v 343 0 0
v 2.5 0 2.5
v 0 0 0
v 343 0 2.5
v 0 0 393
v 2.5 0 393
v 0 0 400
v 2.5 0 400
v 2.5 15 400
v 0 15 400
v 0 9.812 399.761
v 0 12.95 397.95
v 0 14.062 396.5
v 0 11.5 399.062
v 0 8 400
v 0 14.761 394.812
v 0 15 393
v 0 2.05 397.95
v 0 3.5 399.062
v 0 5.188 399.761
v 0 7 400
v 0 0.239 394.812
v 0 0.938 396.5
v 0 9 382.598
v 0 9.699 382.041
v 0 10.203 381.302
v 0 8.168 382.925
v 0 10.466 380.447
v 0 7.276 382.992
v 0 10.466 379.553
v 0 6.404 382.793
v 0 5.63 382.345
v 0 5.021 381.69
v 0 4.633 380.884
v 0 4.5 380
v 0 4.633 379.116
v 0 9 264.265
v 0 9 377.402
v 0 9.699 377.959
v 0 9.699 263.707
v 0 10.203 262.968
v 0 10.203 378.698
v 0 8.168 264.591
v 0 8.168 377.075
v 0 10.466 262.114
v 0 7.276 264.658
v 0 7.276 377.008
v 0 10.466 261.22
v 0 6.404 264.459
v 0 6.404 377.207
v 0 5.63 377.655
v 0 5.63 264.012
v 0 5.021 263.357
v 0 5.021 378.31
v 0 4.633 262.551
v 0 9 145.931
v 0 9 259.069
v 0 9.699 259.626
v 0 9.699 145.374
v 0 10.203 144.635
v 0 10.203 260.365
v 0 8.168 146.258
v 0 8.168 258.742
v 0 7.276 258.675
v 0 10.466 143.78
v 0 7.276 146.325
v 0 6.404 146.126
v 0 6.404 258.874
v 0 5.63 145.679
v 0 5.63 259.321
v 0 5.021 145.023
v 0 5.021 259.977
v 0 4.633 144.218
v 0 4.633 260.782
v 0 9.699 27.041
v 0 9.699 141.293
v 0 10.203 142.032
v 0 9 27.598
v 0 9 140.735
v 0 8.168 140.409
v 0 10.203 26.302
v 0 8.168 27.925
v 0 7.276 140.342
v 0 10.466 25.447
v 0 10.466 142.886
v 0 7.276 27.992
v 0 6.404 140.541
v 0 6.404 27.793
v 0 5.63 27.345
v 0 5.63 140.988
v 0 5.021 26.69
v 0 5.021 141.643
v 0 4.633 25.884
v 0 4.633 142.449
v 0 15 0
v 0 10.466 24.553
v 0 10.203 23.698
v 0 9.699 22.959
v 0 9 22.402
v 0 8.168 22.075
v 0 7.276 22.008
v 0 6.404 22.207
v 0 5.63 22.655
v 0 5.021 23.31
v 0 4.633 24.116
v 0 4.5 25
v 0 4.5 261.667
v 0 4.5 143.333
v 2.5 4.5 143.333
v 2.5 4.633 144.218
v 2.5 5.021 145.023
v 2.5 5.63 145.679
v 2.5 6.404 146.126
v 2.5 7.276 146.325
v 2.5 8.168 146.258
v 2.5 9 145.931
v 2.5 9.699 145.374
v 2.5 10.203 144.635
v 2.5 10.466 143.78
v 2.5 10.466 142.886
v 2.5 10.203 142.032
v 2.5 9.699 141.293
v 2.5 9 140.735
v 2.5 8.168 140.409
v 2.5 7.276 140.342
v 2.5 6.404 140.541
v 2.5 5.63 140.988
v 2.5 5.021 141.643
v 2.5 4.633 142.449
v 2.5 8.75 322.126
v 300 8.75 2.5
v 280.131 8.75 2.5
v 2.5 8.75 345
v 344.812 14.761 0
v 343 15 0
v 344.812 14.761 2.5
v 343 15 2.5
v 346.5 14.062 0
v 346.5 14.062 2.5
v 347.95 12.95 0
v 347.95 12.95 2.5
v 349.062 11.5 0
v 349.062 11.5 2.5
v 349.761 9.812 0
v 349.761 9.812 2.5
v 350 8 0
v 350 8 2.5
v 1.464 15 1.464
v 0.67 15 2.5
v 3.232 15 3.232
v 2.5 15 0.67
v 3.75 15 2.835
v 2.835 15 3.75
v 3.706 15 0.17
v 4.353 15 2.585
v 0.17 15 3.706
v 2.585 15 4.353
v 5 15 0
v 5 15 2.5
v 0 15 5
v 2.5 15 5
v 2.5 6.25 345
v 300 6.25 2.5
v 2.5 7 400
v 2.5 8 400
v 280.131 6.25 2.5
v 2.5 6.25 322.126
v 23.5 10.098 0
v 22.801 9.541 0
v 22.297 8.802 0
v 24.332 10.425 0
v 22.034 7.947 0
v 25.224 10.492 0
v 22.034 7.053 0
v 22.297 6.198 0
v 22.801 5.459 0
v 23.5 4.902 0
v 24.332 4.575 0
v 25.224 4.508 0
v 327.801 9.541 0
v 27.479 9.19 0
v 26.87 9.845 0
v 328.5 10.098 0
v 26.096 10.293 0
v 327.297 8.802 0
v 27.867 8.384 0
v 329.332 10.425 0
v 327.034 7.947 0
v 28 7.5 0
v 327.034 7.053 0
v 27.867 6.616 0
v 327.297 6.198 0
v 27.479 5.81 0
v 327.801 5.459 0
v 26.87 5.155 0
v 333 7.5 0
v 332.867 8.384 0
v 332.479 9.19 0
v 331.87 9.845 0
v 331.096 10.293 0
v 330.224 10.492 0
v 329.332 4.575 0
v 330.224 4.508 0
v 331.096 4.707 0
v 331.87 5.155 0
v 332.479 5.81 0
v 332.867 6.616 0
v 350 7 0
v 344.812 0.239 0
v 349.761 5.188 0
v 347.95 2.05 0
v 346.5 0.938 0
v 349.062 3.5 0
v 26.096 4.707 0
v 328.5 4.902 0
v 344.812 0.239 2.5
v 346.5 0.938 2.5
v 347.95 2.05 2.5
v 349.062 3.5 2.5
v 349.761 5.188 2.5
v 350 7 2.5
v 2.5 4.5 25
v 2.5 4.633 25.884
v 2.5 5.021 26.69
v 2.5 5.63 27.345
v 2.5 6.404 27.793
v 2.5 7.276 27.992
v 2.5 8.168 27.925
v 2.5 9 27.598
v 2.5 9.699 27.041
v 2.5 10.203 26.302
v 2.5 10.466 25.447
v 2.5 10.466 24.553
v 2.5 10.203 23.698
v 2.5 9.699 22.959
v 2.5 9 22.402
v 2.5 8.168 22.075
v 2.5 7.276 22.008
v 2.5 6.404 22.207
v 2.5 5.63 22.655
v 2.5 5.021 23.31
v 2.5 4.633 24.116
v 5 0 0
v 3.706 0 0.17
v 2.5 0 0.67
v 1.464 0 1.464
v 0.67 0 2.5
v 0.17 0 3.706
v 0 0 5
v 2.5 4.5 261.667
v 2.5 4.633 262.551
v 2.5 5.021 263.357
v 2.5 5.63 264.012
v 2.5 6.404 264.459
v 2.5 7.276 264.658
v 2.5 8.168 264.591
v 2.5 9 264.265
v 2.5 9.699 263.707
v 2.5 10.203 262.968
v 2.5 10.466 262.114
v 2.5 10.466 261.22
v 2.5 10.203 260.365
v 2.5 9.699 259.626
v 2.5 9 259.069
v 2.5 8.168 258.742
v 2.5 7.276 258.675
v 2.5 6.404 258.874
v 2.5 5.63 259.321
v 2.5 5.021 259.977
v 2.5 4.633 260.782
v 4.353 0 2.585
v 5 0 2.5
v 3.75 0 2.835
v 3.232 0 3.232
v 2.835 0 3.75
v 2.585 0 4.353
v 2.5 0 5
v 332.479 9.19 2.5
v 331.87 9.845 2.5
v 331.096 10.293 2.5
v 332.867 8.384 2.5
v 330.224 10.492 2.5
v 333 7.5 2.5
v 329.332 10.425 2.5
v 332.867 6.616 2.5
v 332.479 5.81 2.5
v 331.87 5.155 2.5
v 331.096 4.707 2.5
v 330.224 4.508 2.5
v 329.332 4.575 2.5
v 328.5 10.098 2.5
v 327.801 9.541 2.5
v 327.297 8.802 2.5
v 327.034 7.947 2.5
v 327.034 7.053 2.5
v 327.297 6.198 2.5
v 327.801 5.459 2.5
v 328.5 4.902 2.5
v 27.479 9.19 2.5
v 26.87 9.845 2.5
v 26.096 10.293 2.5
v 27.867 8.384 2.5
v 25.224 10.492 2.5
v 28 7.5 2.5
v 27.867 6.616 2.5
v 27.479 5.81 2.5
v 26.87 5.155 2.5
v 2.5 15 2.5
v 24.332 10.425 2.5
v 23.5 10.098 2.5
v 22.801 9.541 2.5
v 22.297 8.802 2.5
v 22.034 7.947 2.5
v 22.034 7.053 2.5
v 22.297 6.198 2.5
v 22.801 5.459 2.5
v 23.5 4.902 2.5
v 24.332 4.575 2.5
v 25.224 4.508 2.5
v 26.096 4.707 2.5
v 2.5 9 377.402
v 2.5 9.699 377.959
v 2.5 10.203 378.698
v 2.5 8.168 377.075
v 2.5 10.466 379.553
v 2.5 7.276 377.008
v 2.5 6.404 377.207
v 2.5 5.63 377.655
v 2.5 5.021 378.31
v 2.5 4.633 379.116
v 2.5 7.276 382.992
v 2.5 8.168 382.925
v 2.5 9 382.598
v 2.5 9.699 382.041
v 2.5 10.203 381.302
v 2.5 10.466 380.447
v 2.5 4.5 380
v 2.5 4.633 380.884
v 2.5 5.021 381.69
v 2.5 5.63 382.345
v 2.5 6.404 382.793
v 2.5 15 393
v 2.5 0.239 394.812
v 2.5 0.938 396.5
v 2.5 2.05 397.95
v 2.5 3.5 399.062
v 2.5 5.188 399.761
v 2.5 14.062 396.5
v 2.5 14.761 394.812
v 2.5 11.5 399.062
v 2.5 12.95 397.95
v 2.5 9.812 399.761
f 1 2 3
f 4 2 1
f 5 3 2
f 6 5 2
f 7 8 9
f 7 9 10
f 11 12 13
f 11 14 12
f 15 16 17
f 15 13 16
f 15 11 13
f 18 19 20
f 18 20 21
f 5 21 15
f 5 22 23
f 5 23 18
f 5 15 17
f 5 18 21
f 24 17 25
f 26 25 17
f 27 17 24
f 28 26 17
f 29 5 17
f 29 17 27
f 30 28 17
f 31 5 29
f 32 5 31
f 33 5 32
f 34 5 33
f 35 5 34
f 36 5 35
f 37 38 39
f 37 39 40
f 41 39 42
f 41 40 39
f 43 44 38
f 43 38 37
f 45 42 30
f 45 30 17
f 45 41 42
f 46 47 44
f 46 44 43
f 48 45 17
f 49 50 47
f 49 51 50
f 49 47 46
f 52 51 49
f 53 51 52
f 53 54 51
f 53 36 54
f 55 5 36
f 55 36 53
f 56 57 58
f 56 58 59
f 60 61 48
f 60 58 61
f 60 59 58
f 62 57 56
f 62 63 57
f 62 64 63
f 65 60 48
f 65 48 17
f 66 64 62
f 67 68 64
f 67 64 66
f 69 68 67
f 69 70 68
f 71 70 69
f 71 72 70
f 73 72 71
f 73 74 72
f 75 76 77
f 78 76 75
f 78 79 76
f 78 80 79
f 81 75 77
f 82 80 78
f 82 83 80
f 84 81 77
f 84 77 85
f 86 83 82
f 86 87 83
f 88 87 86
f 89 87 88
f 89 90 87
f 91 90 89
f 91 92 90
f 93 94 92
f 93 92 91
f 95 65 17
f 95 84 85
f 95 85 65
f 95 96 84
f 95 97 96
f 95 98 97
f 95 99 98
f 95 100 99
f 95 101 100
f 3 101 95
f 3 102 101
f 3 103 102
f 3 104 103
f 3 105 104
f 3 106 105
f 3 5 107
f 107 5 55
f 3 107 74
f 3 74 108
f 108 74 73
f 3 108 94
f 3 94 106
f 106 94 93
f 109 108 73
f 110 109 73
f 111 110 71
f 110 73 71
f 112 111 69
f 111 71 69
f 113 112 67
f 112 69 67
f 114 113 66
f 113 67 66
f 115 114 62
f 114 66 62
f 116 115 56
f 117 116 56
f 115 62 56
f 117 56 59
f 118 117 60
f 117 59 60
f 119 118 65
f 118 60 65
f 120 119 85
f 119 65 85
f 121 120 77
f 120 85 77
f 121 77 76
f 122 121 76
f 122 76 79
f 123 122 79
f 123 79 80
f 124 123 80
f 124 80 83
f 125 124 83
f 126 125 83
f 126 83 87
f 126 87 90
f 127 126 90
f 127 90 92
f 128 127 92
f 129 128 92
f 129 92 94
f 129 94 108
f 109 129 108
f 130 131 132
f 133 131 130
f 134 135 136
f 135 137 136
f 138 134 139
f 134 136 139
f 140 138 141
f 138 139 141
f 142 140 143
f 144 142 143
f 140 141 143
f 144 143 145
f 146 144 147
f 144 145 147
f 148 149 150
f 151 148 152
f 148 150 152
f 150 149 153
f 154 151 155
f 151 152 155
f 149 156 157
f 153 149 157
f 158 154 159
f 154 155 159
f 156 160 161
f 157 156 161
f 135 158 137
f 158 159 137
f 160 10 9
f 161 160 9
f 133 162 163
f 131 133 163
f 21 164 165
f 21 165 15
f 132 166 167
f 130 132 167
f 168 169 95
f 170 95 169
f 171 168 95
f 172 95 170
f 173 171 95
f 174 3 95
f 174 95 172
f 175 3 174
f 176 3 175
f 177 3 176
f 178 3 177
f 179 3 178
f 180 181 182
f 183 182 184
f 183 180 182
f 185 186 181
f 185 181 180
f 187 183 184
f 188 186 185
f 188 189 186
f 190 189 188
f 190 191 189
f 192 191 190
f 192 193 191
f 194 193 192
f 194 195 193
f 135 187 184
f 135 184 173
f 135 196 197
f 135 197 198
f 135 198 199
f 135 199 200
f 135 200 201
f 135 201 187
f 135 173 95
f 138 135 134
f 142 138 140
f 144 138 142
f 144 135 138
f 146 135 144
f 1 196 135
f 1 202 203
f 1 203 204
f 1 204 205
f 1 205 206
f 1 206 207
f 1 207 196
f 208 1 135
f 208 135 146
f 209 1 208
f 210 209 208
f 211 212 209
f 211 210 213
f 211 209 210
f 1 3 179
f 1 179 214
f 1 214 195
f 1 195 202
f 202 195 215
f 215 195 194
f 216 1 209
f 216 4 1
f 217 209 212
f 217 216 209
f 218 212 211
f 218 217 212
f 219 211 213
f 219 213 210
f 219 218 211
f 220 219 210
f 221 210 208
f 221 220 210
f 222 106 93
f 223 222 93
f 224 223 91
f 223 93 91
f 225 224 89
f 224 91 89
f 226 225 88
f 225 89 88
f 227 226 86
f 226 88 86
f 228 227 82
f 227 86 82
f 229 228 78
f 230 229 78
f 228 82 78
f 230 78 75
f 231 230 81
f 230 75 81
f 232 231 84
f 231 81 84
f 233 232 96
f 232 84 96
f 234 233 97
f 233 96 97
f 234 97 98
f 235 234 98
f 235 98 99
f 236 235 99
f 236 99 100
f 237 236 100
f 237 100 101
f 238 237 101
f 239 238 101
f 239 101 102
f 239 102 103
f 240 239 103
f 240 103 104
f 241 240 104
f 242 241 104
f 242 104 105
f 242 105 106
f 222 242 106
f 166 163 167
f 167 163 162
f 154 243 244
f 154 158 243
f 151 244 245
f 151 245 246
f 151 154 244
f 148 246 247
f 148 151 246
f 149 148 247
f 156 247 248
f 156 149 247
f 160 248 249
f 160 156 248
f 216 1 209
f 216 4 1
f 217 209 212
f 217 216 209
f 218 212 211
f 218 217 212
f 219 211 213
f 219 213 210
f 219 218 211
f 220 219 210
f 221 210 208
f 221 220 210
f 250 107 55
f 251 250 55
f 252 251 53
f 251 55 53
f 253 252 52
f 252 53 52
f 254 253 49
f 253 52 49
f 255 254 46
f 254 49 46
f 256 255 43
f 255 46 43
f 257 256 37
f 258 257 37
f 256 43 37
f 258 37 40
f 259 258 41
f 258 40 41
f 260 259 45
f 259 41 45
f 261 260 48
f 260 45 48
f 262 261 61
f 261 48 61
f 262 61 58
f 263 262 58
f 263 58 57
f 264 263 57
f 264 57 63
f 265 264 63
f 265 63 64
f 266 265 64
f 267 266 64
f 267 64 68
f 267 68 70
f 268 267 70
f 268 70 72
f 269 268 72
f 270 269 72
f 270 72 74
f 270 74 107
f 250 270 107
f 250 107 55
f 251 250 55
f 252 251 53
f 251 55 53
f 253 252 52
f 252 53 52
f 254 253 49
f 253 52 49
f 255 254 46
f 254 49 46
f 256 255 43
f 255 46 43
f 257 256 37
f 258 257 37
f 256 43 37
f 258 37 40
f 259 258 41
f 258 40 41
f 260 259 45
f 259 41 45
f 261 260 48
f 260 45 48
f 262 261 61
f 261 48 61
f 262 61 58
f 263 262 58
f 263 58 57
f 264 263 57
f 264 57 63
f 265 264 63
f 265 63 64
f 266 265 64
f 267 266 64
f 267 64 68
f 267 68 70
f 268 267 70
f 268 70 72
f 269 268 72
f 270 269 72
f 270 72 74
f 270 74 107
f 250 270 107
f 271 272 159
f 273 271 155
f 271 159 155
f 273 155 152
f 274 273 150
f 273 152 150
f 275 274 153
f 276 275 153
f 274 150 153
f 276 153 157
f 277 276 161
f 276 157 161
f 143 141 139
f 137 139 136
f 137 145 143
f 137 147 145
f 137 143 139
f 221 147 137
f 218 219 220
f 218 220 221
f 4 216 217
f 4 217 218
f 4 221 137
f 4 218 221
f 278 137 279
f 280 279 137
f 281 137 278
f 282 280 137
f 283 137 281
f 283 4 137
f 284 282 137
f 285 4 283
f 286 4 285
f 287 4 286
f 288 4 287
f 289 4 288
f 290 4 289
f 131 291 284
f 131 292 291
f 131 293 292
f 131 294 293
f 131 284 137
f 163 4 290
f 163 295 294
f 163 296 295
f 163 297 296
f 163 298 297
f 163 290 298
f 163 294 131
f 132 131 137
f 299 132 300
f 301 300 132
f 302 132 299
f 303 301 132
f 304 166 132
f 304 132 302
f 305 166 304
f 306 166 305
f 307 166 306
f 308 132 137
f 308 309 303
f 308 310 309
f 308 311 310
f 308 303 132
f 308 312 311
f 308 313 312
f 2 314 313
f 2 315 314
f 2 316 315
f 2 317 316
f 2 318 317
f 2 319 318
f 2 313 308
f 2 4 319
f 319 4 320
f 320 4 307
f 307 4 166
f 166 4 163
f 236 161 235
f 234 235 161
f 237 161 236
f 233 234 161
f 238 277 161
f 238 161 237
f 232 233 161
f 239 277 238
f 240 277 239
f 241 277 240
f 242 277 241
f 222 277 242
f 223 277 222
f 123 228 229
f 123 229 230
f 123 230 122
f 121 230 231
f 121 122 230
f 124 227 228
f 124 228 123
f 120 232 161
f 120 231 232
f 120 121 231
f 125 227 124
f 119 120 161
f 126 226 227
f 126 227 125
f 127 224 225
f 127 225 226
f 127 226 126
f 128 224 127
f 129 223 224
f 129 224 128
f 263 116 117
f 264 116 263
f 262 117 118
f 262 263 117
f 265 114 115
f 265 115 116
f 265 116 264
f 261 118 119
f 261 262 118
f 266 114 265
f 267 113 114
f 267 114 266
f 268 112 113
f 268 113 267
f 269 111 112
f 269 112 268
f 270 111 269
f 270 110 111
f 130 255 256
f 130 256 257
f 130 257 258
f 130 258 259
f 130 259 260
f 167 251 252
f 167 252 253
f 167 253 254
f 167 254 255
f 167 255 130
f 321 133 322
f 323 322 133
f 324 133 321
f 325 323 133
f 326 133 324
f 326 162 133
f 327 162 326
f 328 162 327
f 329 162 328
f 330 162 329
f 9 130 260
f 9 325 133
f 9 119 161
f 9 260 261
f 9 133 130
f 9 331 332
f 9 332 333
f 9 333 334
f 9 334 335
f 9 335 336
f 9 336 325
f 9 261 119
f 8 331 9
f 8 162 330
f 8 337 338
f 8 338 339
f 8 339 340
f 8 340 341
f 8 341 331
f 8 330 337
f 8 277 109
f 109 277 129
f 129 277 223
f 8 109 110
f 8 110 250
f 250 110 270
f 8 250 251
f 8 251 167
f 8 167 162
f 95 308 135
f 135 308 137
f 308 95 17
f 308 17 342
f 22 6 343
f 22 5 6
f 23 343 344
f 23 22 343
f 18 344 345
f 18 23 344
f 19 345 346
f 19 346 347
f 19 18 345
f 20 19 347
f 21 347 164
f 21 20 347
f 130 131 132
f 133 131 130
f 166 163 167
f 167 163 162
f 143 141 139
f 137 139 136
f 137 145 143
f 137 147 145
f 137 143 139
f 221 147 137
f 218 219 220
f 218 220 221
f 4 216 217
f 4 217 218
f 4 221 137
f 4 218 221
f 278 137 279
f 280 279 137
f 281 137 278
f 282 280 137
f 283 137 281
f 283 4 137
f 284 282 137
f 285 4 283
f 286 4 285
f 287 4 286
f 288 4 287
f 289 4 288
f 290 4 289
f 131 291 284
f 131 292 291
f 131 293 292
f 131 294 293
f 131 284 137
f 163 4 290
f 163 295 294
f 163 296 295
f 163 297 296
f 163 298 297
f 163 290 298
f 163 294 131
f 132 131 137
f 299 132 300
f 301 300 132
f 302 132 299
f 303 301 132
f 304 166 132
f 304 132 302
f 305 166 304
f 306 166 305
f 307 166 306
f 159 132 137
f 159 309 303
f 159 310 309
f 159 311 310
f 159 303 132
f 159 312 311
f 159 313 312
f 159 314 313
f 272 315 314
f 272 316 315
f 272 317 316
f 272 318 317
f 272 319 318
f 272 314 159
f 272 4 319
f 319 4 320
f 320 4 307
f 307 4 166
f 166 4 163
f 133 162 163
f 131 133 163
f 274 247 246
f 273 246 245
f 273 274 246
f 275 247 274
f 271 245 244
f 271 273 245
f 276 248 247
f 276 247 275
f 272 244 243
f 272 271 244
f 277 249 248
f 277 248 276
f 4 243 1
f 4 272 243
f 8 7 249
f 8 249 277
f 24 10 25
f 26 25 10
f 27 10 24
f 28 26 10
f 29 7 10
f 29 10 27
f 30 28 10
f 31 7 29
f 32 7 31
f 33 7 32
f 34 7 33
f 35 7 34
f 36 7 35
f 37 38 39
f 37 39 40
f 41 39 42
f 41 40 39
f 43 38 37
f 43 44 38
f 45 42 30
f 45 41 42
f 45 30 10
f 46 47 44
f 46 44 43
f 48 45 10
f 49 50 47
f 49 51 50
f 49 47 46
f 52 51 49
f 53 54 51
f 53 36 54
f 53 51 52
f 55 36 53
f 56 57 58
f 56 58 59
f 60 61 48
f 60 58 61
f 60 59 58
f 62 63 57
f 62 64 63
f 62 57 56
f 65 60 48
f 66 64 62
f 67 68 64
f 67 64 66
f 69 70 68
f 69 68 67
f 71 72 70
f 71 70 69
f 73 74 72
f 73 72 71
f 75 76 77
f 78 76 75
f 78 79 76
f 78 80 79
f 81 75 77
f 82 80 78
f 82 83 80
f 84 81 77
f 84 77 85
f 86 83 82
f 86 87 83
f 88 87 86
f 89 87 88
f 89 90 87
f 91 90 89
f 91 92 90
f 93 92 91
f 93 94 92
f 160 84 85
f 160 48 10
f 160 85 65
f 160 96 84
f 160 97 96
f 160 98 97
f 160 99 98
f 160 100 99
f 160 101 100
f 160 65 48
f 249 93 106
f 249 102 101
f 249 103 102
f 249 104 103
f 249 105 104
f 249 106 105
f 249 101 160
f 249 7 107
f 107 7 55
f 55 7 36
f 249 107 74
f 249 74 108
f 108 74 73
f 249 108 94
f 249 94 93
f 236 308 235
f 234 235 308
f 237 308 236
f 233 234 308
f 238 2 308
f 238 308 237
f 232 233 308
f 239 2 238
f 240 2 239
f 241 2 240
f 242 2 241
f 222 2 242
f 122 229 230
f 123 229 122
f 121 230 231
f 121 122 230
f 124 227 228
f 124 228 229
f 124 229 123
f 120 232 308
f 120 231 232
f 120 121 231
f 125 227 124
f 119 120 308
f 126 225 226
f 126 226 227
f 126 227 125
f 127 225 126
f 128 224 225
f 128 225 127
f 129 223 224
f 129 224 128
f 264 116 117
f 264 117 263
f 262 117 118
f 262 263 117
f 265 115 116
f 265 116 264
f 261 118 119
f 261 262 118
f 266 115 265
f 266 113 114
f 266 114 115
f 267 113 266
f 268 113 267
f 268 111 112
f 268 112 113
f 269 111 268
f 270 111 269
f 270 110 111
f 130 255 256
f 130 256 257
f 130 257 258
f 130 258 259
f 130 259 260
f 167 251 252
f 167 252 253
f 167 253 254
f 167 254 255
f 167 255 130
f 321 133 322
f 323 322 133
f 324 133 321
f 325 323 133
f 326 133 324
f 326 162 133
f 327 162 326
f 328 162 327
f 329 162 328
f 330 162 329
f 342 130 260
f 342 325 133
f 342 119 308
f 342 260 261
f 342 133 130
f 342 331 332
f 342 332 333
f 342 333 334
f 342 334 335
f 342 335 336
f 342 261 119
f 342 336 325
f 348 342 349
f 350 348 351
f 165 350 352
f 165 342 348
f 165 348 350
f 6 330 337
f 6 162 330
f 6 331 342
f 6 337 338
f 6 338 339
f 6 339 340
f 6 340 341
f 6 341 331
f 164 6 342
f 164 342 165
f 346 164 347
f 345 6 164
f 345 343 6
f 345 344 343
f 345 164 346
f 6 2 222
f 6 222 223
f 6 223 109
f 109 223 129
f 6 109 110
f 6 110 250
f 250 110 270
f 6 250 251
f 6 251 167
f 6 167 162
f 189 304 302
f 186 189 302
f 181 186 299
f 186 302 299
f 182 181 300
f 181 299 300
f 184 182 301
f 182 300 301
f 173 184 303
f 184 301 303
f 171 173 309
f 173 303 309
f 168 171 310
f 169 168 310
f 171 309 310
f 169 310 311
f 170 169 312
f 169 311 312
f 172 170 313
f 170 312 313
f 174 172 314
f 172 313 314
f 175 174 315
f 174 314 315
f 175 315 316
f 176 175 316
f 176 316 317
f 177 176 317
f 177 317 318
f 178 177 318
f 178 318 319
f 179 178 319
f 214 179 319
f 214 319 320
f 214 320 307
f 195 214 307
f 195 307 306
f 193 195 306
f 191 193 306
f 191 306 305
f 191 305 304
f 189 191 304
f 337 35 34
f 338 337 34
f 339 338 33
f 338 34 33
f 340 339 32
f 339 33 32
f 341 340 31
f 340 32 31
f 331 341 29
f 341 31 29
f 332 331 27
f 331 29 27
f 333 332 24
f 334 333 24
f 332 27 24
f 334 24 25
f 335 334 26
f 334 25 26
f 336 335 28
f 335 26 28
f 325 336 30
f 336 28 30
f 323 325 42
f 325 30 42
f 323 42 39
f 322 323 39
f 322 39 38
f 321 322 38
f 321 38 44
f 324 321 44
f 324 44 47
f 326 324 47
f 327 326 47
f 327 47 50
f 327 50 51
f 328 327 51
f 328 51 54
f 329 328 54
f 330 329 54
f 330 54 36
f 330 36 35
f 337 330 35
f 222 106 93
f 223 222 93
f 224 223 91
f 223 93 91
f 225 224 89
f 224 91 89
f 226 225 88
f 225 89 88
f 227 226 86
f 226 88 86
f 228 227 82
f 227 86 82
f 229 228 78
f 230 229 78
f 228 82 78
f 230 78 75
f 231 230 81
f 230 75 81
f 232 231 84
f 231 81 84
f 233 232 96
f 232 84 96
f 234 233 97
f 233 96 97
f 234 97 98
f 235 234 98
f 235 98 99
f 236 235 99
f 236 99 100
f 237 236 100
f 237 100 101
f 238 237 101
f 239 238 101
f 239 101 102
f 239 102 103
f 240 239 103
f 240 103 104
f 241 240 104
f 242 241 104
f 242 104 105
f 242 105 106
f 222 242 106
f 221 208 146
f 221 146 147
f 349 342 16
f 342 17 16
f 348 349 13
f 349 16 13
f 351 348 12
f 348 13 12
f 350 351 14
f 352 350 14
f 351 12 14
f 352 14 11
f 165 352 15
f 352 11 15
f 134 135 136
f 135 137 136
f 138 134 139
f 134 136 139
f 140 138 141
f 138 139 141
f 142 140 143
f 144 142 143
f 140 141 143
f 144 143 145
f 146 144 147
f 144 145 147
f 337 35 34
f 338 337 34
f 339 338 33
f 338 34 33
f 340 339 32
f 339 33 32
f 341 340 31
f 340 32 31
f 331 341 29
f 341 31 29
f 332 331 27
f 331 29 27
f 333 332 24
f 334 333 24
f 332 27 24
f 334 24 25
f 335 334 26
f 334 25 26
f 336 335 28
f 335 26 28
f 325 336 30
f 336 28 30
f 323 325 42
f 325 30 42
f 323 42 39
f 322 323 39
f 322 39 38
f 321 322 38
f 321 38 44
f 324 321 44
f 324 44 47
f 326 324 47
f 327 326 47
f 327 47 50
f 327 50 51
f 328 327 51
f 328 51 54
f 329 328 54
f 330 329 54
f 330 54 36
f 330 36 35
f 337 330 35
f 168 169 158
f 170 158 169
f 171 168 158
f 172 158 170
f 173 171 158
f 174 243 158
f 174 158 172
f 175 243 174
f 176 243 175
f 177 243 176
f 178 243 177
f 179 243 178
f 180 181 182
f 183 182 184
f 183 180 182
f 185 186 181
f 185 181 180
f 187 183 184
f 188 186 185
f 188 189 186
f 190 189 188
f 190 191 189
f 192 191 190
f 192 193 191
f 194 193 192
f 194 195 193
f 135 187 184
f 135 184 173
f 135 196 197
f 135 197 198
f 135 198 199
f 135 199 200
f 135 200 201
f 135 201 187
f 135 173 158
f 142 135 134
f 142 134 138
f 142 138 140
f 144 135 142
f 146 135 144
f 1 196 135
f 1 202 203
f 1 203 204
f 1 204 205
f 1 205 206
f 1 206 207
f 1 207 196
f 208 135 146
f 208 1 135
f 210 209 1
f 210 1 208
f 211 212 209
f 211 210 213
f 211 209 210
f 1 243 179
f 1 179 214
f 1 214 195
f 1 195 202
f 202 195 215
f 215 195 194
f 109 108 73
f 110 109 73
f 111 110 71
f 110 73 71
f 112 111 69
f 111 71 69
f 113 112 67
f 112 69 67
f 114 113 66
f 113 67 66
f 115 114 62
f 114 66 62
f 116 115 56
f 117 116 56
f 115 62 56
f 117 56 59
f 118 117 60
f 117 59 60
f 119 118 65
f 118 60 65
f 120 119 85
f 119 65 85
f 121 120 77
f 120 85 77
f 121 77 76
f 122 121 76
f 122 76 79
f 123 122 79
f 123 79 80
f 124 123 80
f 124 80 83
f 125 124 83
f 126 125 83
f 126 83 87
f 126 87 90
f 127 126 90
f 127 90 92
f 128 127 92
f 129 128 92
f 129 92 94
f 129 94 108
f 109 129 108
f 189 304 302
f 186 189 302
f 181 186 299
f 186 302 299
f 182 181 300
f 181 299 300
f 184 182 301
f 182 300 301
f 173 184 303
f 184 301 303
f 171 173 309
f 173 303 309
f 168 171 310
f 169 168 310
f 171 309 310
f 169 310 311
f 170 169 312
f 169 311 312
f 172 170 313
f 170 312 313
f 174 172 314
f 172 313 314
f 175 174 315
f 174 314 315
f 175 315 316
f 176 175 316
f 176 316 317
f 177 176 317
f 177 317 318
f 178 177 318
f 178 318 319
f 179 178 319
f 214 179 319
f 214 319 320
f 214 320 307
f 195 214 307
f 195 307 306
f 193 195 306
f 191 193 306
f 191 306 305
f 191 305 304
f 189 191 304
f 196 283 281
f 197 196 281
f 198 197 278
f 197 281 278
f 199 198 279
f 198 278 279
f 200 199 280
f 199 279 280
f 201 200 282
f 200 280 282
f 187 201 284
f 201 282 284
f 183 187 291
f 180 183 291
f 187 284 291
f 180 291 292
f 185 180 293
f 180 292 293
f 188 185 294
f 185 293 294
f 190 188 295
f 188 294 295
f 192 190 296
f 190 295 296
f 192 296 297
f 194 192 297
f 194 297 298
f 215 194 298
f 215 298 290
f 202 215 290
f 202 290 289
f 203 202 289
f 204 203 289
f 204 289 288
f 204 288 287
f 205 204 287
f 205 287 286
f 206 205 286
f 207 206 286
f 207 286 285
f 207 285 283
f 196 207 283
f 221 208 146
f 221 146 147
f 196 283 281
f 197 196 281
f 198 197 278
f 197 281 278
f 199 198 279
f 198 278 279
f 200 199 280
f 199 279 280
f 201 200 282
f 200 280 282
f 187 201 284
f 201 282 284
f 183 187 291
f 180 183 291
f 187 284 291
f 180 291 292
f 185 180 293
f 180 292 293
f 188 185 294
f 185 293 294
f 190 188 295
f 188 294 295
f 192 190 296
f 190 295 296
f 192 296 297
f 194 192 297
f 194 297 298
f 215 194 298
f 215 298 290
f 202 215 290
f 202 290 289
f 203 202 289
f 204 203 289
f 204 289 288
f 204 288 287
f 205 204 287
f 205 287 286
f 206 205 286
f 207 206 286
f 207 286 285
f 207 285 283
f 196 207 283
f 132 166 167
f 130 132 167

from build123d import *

# Parameters (mm, degrees)
SKETCH002_R      = 3
EXTRUDE002_DEPTH = 10
SKETCH001_R      = 3
EXTRUDE001_DEPTH = 10
EXTRUDE_DEPTH    = 15
EXTRUDE003_DEPTH = 2.5
FILLET_R         = 7
FILLET001_R      = 7
FILLET002_R      = 2.5
FILLET003_R      = 5


with BuildPart() as extrude002:
    # Sketch002 (on Face1 of Extrude) → Extrude002 (new body)
    with BuildSketch(Plane(origin=(0, 0, 0), x_dir=(0, -1, 0), z_dir=(-1, 0, 0))):
        with Locations((-7.5, 25)):
            Circle(SKETCH002_R)
        with Locations((-7.5, 143.333333)):
            Circle(SKETCH002_R)
        with Locations((-7.5, 261.666667)):
            Circle(SKETCH002_R)
        with Locations((-7.5, 380)):
            Circle(SKETCH002_R)
    extrude(amount=-EXTRUDE002_DEPTH)


with BuildPart() as extrude001:
    # Sketch001 (on Face4 of Extrude) → Extrude001 (new body)
    with BuildSketch(Plane.XY.offset(2.5)):
        with Locations((25, 7.5)):
            Circle(SKETCH001_R)
        with Locations((330, 7.5)):
            Circle(SKETCH001_R)
    extrude(amount=-EXTRUDE001_DEPTH)


with BuildPart() as cut001:
    # Sketch → Extrude (new body)
    with BuildSketch(Plane.XZ):
        Polygon((0, 0), (350, 0), (350, 2.5), (2.5, 2.5), (2.5, 400), (0, 400), align=None)
    extrude(amount=-EXTRUDE_DEPTH)

    # Cut: cut Extrude001
    add(extrude001.part, mode=Mode.SUBTRACT)

    # Cut001: cut Extrude002
    add(extrude002.part, mode=Mode.SUBTRACT)


with BuildPart() as fillet_body:
    # Sketch003 → Extrude003 (new body)
    with BuildSketch(Plane.XZ):
        Polygon((300, 2.5), (280.131432, 2.5), (2.5, 322.126103), (2.5, 345), align=None)
    extrude(amount=-EXTRUDE003_DEPTH)


with BuildPart() as fillet_body_1:
    # Extrude003 placement: moved
    add(fillet_body.part.moved(Location((0, 6.25, 0))))

    # Fusion: union Cut001
    add(cut001.part)

    # Fillet
    fillet_edges = [fillet_body_1.edges().sort_by_distance(p)[0] for p in [
        (350, 0, 1.25),
        (350, 15, 1.25),
    ]]
    fillet(fillet_edges, radius=FILLET_R)


with BuildPart() as fillet001:
    # Fillet001 base: copy of Fillet body
    add(fillet_body_1.part)

    # Fillet001
    fillet001_edges = [fillet001.edges().sort_by_distance(p)[0] for p in [
        (1.25, 0, 400),
        (1.25, 15, 400),
    ]]
    fillet(fillet001_edges, radius=FILLET001_R)


with BuildPart() as fillet003:
    # Fillet002 base: copy of Fillet body
    add(fillet_body_1.part)

    # Fillet002
    fillet002_edges = [fillet003.edges().sort_by_distance(p)[0] for p in [
        (2.5, 7.5, 2.5),
    ]]
    fillet(fillet002_edges, radius=FILLET002_R)

    # Fillet003
    fillet003_edges = [fillet003.edges().sort_by_distance(p)[0] for p in [
        (0, 7.5, 0),
    ]]
    fillet(fillet003_edges, radius=FILLET003_R)


solid = Compound([fillet001.part, fillet003.part])
